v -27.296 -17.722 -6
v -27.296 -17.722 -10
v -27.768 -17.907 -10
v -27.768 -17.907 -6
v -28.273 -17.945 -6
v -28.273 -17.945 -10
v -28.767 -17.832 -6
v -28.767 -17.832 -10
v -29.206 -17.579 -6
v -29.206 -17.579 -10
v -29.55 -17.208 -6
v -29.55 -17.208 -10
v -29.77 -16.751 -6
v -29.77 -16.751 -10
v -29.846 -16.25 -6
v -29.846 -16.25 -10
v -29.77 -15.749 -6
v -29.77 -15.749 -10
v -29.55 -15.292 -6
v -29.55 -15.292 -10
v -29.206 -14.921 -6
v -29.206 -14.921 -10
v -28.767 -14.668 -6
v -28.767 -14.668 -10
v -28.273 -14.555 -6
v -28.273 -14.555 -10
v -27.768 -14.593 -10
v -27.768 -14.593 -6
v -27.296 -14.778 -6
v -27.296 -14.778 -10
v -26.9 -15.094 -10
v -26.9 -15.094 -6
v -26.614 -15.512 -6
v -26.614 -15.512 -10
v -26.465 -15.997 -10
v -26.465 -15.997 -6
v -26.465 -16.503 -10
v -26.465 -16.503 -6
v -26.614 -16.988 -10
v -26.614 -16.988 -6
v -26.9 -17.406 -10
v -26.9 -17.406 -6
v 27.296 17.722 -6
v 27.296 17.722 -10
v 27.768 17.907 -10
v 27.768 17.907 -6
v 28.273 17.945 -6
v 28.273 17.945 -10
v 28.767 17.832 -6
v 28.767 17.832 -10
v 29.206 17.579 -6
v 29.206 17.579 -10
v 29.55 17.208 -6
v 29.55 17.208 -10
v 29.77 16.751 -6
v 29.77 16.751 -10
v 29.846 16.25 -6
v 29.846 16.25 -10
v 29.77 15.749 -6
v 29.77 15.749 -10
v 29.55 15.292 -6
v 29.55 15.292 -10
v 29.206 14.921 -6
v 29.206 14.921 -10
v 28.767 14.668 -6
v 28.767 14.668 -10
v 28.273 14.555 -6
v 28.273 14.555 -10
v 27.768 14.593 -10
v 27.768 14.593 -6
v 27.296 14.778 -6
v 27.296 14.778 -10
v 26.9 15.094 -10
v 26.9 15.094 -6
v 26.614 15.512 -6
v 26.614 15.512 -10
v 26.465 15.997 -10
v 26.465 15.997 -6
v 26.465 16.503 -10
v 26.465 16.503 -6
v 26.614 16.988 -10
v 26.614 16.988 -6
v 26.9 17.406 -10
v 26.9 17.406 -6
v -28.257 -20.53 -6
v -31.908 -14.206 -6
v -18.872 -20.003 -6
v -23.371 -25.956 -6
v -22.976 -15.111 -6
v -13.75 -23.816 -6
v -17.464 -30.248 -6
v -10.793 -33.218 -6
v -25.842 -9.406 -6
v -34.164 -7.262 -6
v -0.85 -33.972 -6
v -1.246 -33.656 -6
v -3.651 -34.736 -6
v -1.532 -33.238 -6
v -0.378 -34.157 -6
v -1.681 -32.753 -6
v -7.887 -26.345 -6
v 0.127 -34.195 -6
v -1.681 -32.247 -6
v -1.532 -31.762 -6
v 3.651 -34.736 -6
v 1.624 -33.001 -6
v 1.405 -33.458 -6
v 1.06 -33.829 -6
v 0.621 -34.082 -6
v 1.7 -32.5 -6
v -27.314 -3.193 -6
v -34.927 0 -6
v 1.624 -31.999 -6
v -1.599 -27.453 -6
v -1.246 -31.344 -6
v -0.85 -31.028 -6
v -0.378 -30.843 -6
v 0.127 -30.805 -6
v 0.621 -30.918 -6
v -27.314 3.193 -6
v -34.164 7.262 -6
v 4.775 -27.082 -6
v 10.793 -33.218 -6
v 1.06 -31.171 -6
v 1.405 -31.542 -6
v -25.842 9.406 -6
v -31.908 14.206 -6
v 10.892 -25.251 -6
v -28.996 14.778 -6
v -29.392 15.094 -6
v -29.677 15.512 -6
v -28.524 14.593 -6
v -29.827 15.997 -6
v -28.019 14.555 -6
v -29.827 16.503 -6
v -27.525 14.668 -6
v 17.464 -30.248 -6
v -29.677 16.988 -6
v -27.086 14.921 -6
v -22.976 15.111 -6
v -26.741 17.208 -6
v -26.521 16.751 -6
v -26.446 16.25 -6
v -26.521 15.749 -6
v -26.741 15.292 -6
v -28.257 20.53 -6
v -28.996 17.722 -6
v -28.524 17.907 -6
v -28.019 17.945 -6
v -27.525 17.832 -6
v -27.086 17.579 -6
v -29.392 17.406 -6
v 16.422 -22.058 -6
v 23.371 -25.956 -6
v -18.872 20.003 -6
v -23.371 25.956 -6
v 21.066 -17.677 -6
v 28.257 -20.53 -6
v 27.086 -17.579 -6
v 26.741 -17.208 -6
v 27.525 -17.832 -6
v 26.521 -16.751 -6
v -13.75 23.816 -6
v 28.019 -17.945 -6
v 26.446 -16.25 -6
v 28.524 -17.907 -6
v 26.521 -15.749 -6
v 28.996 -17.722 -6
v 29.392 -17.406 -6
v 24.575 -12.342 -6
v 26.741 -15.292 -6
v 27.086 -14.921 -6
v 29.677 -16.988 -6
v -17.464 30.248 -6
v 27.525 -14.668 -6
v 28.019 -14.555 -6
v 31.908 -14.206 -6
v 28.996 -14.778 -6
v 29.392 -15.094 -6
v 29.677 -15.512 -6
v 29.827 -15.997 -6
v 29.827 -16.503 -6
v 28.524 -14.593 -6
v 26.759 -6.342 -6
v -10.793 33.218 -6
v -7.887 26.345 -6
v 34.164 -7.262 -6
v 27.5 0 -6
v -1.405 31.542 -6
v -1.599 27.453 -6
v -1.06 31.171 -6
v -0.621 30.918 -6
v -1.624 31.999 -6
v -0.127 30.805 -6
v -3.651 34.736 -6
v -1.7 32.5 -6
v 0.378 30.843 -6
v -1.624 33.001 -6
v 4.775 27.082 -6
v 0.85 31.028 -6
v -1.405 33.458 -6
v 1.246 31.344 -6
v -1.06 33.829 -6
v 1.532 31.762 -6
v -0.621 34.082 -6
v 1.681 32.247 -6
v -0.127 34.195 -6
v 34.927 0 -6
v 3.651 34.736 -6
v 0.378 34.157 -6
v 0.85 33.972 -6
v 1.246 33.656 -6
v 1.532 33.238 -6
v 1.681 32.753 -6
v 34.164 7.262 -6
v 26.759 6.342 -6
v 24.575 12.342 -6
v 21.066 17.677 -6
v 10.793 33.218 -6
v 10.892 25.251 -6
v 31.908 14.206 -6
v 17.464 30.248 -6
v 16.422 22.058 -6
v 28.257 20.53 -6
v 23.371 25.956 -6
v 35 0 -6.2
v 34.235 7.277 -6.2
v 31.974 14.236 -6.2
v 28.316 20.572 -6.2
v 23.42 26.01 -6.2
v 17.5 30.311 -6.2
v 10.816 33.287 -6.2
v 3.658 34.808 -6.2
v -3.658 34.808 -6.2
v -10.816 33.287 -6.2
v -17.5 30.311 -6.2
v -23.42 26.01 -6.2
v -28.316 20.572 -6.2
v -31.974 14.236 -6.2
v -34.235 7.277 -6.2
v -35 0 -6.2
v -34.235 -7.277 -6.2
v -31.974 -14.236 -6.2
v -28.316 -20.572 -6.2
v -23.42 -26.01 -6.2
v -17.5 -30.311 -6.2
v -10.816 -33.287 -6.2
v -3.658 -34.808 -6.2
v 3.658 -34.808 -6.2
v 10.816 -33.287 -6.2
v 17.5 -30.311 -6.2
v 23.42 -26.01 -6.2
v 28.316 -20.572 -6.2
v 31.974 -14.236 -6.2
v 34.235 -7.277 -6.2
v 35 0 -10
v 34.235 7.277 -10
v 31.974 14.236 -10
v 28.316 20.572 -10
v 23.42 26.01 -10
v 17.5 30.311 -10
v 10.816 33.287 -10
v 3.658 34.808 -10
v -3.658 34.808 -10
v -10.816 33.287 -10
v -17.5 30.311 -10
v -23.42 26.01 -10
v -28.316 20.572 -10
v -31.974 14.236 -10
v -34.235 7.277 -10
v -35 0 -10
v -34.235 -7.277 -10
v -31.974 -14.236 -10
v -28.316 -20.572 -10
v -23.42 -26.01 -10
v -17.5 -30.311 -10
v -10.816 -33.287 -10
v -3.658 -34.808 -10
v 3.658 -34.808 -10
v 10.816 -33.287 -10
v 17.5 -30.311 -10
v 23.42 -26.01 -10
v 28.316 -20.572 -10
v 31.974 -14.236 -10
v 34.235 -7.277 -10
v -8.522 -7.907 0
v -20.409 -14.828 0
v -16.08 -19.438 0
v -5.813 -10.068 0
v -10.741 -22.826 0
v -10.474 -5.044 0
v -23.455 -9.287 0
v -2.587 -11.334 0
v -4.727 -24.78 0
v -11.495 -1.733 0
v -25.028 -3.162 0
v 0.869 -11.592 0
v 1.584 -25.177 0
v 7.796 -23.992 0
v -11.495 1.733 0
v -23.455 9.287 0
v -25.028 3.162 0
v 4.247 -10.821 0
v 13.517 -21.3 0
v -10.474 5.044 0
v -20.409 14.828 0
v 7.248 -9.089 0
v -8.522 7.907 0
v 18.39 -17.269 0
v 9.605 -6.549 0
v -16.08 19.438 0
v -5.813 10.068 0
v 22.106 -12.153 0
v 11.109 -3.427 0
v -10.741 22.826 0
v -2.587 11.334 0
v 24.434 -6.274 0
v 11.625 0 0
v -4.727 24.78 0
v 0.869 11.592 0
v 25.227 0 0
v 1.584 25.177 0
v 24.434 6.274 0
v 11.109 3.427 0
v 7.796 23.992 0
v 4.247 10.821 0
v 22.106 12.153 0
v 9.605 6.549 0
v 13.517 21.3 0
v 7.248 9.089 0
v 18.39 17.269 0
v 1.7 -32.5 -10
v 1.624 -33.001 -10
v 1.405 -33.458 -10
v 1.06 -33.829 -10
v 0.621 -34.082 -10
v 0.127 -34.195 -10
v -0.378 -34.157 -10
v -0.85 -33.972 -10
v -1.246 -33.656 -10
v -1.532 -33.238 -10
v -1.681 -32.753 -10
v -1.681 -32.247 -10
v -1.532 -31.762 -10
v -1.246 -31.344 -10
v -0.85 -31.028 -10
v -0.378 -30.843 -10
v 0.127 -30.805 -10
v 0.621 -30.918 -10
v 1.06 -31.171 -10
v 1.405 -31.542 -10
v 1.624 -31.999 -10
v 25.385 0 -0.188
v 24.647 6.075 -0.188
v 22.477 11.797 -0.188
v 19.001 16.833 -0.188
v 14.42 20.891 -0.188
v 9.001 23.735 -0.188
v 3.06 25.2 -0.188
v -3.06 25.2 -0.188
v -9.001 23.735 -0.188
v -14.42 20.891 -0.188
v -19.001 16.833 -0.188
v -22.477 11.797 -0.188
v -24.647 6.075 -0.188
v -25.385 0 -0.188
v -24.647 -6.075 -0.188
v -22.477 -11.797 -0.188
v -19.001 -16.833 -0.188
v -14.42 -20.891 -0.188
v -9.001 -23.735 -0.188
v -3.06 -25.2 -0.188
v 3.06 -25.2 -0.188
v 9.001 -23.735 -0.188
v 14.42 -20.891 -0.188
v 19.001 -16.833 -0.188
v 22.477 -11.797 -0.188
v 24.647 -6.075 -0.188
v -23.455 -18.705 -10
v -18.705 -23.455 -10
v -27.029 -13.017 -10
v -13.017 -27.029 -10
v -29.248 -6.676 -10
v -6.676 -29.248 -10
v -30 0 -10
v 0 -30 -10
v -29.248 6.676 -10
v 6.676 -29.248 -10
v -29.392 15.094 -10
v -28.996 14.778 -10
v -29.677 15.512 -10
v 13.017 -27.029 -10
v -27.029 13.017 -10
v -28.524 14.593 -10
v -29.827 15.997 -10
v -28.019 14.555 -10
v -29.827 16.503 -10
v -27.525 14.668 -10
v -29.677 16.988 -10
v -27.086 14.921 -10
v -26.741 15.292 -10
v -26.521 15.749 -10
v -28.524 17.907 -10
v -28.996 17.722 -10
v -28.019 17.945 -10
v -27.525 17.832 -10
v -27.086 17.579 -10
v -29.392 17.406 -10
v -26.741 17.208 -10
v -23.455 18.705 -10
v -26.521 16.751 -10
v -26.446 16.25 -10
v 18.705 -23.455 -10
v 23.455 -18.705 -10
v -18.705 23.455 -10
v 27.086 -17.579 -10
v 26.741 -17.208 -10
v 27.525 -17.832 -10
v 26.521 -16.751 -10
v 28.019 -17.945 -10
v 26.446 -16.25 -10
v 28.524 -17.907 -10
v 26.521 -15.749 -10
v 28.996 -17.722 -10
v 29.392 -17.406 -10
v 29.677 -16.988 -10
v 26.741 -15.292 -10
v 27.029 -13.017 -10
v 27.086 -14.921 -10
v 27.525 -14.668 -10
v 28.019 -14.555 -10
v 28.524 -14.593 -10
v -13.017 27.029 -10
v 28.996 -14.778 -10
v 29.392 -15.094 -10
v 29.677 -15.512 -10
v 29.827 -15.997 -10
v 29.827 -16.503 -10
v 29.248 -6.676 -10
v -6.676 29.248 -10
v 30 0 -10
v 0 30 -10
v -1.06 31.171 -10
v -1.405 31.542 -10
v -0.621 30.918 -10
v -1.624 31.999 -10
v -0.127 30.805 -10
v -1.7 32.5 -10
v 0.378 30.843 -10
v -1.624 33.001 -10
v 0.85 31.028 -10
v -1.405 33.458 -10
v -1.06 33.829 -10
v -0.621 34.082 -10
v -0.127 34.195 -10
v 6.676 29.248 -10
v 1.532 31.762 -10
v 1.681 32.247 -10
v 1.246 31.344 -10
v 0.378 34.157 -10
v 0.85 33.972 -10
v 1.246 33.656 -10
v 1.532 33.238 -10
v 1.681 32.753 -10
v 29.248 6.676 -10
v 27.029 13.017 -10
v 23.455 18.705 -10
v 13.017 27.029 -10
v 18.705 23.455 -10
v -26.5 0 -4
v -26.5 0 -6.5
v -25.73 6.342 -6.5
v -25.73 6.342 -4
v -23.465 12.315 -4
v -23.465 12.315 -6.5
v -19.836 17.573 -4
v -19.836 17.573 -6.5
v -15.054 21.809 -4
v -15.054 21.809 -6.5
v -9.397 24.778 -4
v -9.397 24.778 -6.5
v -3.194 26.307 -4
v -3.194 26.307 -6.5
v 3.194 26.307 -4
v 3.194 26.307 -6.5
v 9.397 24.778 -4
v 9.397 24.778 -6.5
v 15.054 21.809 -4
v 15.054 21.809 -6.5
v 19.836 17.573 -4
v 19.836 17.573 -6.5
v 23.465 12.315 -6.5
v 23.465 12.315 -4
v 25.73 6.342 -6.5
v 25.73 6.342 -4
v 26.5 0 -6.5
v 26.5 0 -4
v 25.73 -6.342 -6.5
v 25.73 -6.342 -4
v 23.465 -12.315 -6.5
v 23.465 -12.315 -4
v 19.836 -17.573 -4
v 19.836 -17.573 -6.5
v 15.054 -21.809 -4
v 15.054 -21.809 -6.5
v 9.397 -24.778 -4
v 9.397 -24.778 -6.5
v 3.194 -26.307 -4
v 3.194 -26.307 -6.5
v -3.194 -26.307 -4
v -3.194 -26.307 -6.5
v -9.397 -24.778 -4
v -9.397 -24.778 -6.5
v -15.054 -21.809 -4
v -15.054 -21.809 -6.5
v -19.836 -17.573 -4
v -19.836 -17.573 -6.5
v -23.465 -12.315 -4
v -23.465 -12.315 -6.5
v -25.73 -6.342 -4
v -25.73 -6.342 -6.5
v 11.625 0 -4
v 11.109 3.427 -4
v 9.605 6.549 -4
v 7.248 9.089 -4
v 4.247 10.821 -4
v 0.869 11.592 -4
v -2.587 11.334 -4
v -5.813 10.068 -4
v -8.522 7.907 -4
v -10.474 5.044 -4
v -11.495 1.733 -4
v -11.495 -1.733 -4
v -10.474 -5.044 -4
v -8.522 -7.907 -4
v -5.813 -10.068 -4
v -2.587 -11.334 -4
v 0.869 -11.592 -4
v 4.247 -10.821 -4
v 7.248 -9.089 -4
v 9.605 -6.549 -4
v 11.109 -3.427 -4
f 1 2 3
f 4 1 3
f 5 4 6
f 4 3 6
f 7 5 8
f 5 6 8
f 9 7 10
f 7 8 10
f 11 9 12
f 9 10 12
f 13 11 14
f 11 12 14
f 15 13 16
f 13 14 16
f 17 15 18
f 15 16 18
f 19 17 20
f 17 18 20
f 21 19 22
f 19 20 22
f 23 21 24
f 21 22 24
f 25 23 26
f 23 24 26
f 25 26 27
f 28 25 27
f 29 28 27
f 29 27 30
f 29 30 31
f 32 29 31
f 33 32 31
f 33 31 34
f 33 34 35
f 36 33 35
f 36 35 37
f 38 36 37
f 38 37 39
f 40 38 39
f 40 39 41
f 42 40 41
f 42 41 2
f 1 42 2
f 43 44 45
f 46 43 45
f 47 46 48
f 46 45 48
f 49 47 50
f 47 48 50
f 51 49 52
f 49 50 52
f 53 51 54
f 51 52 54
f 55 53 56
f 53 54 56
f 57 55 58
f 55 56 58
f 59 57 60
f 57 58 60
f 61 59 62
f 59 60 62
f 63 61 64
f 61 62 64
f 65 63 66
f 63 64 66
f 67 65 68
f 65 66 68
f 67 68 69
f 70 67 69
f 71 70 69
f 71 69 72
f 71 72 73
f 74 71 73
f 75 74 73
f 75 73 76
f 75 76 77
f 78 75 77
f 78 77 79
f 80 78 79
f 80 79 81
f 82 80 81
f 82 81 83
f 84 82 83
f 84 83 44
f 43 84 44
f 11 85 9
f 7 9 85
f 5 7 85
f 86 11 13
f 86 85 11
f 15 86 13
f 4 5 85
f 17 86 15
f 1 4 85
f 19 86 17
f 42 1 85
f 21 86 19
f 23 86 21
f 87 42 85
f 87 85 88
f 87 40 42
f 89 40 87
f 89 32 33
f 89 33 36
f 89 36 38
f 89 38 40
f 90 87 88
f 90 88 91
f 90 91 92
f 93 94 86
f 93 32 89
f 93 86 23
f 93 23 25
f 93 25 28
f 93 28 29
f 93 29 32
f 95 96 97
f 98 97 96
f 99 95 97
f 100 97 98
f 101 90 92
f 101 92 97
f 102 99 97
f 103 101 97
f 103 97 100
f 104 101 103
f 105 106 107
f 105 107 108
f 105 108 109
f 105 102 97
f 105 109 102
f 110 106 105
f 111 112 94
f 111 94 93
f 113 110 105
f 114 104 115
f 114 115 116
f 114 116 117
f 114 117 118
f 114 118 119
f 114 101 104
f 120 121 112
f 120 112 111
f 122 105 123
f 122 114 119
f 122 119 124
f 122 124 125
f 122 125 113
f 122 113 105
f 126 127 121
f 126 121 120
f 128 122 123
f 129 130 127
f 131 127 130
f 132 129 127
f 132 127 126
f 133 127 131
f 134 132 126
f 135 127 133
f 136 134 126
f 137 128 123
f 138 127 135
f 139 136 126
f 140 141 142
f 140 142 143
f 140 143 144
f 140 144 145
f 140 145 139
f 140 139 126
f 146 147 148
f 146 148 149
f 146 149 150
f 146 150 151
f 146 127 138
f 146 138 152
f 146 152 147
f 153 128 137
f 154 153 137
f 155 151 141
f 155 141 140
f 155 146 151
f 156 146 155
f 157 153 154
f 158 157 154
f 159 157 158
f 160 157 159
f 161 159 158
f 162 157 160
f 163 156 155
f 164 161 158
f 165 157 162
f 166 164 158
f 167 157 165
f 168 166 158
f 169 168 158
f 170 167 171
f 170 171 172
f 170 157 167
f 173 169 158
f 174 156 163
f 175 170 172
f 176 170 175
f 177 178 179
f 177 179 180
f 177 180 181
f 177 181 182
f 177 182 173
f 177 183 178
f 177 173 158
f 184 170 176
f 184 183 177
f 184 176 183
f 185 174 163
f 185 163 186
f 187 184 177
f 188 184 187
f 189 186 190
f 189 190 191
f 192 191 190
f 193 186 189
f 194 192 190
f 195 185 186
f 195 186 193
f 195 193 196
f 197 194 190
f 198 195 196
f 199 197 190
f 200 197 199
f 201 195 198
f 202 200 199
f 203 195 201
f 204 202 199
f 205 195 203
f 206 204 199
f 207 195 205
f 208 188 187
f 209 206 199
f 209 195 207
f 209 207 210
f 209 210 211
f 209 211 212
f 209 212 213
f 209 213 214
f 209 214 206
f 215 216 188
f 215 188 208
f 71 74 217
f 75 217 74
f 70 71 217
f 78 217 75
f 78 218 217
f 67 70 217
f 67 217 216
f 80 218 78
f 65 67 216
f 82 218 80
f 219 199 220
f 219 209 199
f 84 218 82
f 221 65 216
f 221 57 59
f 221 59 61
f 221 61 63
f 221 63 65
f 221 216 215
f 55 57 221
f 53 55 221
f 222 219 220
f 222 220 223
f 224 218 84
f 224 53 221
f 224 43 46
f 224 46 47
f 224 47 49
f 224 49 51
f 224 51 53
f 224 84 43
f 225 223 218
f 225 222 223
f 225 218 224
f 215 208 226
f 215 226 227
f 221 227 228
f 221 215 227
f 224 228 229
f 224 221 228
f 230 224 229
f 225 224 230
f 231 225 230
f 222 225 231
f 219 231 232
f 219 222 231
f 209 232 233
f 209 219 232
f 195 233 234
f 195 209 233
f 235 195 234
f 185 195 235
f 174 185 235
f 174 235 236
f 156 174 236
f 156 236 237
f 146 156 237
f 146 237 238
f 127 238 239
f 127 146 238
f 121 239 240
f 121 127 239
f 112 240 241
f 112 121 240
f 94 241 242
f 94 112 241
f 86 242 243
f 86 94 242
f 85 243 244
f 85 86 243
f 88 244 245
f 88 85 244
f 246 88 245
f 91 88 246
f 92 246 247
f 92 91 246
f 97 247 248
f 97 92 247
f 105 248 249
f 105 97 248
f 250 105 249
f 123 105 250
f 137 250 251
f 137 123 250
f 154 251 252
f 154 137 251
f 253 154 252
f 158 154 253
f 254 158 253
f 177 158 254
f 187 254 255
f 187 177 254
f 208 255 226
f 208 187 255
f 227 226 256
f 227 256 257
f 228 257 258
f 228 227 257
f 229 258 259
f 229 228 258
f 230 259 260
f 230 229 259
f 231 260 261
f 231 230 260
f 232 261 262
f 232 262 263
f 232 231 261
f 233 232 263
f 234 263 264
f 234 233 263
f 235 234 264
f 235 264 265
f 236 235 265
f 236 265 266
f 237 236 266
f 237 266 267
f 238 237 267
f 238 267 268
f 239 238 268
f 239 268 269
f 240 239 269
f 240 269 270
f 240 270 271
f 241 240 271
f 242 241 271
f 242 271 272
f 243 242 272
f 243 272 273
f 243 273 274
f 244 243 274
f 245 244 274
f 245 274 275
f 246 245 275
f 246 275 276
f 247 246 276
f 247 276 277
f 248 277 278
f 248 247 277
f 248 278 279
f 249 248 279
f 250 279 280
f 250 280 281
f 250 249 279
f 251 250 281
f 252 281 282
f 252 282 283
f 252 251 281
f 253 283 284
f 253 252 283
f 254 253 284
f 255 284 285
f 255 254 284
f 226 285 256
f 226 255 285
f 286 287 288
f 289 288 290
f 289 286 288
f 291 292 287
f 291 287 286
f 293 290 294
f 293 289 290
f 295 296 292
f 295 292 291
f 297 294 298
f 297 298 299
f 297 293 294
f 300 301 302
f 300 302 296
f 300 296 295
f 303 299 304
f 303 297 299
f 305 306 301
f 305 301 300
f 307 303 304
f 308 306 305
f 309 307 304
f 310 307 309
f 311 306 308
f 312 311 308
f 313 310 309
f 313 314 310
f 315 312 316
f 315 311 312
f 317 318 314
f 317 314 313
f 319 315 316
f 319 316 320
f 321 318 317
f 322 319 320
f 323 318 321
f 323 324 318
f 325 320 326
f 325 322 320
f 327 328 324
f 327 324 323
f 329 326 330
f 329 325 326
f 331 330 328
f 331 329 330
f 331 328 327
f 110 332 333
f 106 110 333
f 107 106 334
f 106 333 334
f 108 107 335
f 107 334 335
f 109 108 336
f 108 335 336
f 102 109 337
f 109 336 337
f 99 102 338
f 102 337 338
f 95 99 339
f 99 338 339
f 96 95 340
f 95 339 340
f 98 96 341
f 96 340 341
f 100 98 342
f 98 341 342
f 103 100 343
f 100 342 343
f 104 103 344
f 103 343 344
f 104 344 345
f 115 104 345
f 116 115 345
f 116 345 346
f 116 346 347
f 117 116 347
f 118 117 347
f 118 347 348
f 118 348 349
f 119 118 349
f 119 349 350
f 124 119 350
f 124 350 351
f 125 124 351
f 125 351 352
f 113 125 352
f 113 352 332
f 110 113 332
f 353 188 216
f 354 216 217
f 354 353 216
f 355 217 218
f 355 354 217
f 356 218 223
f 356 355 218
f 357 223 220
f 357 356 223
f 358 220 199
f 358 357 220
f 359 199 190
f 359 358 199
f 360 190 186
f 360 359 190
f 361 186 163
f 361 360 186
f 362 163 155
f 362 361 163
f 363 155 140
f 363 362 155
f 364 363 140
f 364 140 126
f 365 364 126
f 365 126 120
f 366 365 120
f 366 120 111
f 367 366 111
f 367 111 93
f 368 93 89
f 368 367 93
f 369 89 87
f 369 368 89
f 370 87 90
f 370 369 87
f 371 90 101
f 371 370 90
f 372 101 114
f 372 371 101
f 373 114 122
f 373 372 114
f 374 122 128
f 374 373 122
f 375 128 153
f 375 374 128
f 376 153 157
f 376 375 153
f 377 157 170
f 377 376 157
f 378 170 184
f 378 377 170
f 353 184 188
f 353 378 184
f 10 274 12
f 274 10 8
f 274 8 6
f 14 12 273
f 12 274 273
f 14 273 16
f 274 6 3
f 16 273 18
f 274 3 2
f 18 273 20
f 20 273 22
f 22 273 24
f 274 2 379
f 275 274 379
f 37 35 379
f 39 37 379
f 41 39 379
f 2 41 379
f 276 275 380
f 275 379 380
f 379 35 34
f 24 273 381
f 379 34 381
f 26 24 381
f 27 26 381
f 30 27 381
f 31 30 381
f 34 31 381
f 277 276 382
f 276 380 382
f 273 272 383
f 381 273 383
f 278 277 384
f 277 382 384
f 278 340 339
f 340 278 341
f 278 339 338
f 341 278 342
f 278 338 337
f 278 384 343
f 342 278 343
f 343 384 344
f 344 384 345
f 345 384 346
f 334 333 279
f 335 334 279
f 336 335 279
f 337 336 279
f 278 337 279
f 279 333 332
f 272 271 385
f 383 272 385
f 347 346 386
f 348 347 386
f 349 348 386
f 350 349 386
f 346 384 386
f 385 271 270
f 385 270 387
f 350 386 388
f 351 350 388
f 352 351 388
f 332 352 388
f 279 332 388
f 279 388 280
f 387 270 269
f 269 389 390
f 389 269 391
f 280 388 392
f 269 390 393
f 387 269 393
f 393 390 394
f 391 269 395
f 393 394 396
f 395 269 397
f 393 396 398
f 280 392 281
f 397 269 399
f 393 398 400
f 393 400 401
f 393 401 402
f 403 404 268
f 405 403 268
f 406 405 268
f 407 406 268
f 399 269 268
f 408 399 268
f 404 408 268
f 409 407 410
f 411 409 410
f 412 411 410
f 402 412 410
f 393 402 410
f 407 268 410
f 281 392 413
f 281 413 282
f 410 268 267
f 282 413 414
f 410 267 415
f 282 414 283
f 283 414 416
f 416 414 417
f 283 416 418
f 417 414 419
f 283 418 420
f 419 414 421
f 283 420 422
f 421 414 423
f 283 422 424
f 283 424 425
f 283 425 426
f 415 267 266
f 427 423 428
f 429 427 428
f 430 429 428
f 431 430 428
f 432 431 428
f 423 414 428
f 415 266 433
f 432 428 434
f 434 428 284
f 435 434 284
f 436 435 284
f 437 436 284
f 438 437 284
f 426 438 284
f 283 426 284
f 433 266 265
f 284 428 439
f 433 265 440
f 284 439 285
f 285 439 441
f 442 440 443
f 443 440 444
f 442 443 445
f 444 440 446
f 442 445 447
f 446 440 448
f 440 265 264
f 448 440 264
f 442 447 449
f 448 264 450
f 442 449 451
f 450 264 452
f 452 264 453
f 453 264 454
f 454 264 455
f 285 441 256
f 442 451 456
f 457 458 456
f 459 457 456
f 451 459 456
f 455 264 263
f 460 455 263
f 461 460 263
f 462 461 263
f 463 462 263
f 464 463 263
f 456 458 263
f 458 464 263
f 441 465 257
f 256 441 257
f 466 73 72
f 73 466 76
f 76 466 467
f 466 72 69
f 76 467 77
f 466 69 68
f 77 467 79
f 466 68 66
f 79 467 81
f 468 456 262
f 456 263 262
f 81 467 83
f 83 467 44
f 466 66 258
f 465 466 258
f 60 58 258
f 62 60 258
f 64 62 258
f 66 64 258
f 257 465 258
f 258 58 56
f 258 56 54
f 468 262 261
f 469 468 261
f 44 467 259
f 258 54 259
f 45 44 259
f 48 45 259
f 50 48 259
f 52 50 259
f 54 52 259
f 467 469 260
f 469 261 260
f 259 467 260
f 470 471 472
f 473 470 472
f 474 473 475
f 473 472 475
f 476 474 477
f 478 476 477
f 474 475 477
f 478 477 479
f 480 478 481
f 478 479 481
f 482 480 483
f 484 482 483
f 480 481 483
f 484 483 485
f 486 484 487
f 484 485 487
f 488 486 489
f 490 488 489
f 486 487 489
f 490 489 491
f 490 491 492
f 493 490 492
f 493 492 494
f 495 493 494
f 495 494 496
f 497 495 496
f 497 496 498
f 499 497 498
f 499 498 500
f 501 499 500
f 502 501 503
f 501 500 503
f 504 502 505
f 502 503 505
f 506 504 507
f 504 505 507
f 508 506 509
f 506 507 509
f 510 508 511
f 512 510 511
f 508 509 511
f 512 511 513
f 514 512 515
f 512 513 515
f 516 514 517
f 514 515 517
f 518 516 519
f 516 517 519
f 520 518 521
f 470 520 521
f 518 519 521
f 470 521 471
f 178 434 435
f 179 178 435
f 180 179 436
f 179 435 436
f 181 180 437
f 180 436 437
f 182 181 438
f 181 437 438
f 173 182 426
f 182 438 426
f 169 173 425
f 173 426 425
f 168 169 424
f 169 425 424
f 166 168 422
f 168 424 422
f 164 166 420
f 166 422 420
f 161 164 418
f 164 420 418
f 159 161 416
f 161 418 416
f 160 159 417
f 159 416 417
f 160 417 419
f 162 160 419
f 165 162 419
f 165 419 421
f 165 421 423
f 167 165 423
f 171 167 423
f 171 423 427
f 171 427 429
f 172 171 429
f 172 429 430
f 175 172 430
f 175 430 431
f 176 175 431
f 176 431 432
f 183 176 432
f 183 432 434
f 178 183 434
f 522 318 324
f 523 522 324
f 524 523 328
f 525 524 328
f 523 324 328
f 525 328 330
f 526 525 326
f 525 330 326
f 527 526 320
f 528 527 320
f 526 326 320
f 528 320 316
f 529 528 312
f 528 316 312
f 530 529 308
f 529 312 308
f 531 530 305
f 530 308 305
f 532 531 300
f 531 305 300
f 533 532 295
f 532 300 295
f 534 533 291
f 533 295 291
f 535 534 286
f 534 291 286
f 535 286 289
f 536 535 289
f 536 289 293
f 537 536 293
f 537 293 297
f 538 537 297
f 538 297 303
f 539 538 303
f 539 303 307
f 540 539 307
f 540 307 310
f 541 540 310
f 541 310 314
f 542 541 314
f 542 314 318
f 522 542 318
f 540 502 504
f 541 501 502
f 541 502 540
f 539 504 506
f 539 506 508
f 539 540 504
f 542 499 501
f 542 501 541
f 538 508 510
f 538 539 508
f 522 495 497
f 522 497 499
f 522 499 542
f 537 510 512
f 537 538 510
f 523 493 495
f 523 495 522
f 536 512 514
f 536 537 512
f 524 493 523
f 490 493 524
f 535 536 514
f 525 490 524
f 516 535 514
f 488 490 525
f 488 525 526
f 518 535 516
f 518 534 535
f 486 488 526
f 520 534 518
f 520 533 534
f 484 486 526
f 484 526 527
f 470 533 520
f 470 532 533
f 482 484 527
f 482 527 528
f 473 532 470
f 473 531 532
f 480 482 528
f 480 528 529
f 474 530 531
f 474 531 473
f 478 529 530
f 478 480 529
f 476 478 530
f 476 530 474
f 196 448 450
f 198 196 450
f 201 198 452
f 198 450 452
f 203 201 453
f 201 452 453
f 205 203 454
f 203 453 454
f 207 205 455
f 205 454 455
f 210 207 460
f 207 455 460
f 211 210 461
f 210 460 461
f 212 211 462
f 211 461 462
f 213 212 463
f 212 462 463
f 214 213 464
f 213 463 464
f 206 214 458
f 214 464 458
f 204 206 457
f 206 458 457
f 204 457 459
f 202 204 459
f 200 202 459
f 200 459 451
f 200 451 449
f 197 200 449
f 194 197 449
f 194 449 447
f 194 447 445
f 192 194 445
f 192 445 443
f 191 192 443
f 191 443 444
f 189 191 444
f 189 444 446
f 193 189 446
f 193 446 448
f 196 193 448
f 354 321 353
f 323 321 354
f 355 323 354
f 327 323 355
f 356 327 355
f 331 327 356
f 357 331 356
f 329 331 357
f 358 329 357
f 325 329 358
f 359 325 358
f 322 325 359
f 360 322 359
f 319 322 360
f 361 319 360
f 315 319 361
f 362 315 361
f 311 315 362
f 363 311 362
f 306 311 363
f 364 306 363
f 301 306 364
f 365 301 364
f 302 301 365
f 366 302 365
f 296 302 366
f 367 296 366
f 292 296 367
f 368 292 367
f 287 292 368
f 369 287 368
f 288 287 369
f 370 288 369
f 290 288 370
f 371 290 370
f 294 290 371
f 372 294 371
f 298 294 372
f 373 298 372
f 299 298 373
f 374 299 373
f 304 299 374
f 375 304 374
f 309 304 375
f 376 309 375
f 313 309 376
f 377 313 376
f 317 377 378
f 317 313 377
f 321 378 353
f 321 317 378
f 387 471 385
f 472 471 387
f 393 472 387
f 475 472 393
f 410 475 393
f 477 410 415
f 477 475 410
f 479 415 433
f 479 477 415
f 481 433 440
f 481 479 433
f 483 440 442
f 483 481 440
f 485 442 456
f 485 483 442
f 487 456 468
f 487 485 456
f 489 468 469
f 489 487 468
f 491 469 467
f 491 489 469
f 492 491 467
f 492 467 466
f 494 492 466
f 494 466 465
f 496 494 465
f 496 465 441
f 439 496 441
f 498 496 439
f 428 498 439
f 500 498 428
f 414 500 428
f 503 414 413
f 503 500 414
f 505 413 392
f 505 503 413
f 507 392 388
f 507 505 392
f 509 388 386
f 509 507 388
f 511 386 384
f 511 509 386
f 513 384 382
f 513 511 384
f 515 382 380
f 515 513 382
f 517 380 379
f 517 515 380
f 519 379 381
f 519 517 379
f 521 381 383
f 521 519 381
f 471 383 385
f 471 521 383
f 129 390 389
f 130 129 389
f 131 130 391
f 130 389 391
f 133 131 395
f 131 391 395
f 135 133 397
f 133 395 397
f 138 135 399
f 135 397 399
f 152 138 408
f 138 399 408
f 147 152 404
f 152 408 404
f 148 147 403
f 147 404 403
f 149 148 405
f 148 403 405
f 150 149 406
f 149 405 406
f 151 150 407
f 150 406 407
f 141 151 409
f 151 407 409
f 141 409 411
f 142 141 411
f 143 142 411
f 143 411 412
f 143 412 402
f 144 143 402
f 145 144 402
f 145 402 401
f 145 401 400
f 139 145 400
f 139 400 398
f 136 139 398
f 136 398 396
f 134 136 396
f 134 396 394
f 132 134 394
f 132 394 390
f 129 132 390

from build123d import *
from OCP.BRepFilletAPI import BRepFilletAPI_MakeChamfer

# Parameters (mm, degrees)
SKETCH1_R            = 35
BOSS_EXTRUDE1_DEPTH  = 10
SKETCH2_R            = 26.5
CUT_EXTRUDE1_DEPTH   = 6
CHAMFER1_SIZE        = 3.5
SKETCH5_R            = 35
SKETCH5_R_2          = 27.5
CUT_EXTRUDE3_DEPTH   = 6
CHAMFER3_SIZE        = 6
CHAMFER3_SIZE_2      = 2.183821406
SKETCH6_R            = 11.625
CUT_EXTRUDE4_DEPTH   = 6
M3_CLEARANCE_HOLE1_D = 3.4
CIRPATTERN1_COUNT    = 6
CHAMFER4_SIZE        = 0.2
CHAMFER4_SIZE2       = 0.072794047
CHAMFER4_SIZE2_2     = 0.089295118


with BuildPart() as part:
    # Sketch1 → Boss-Extrude1 (new body)
    with BuildSketch(Plane.XY):
        Circle(SKETCH1_R)
    extrude(amount=-BOSS_EXTRUDE1_DEPTH)

    # Sketch2 → Cut-Extrude1 (cut)
    with BuildSketch(Plane(origin=(0, 0, -10), x_dir=(-1, 0, 0), z_dir=(0, 0, -1))):
        Circle(SKETCH2_R)
    extrude(amount=-CUT_EXTRUDE1_DEPTH, mode=Mode.SUBTRACT)

    # Chamfer1
    chamfer1_edges = [part.edges().sort_by_distance(p)[0] for p in [
        (26.5, 0, -10),
    ]]
    chamfer(chamfer1_edges, length=CHAMFER1_SIZE)

    # Sketch5 → Cut-Extrude3 (cut)
    with BuildSketch(Plane.XY):
        Circle(SKETCH5_R)
        Circle(SKETCH5_R_2, mode=Mode.SUBTRACT)
    extrude(amount=-CUT_EXTRUDE3_DEPTH, mode=Mode.SUBTRACT)

    # Chamfer3
    # the kernel refuses this chamfer: 6, 2.183821406 mm, written as the material it takes off along each edge
    with BuildSketch(Plane(origin=(0, 0, 0), x_dir=(1, 0, 0), z_dir=(0, -1, 0))) as chamfer3_piece_1_section:
        Polygon((27.5, -CHAMFER3_SIZE), (27.5 - CHAMFER3_SIZE_2, 0), (27.5, 0), align=None)
    chamfer3_piece_1 = revolve(axis=Axis((0, 0, 0), (0, 0, 1)), mode=Mode.PRIVATE)
    chamfer3_piece_1 = split(chamfer3_piece_1, bisect_by=Plane(origin=(-26.469518779, 0, -6), z_dir=(0, 0, 1)), keep=Keep.TOP, mode=Mode.PRIVATE)
    add(chamfer3_piece_1, mode=Mode.SUBTRACT)

    # Sketch6 → Cut-Extrude4 (cut)
    with BuildSketch(Plane.XY):
        Circle(SKETCH6_R)
    extrude(amount=-CUT_EXTRUDE4_DEPTH, mode=Mode.SUBTRACT)

    # M3 Clearance Hole1 (through all)
    with Locations(Plane(origin=(0, 32.5, -6), x_dir=(1, 0, 0), z_dir=(0, 0, 1))):
        with Locations((0, 0)):
            m3_clearance_hole1 = Hole(M3_CLEARANCE_HOLE1_D / 2)

    # CirPattern1: M3 Clearance Hole1 ×6 about axis
    cirpattern1_axis = Axis((0, 0, 0), (0, 0, 1))
    for i in range(1, CIRPATTERN1_COUNT):
        add(m3_clearance_hole1.rotate(cirpattern1_axis, i * 360 / CIRPATTERN1_COUNT), mode=Mode.SUBTRACT)

    # Chamfer4: one chamfer whose edges measure the first distance from different faces: ONE call of the kernel's chamfer builder (chamfer() names one face for all edges)
    chamfer4_edges_1 = [part.edges().sort_by_distance(p)[0] for p in [
        (-35, 0, -6),
    ]]
    chamfer4_side_1 = [part.faces().sort_by_distance(p)[0] for p in [
        (-35, 0, -8),
    ]]
    chamfer4_edges_2 = [part.edges().sort_by_distance(p)[0] for p in [
        (-25.316178594, 0, 0),
    ]]
    chamfer4_side_2 = [part.faces().sort_by_distance(p)[0] for p in [
        (-26.408089297, 0, -3),
    ]]
    chamfer4 = BRepFilletAPI_MakeChamfer(part.part.solid().wrapped)
    for e in chamfer4_edges_1:
        chamfer4.Add(CHAMFER4_SIZE, CHAMFER4_SIZE2, e.wrapped, chamfer4_side_1[0].wrapped)  # the first distance lies on this face
    for e in chamfer4_edges_2:
        chamfer4.Add(CHAMFER4_SIZE, CHAMFER4_SIZE2_2, e.wrapped, chamfer4_side_2[0].wrapped)  # the first distance lies on this face
    add(Compound.cast(chamfer4.Shape()), mode=Mode.REPLACE)


solid = part.part
